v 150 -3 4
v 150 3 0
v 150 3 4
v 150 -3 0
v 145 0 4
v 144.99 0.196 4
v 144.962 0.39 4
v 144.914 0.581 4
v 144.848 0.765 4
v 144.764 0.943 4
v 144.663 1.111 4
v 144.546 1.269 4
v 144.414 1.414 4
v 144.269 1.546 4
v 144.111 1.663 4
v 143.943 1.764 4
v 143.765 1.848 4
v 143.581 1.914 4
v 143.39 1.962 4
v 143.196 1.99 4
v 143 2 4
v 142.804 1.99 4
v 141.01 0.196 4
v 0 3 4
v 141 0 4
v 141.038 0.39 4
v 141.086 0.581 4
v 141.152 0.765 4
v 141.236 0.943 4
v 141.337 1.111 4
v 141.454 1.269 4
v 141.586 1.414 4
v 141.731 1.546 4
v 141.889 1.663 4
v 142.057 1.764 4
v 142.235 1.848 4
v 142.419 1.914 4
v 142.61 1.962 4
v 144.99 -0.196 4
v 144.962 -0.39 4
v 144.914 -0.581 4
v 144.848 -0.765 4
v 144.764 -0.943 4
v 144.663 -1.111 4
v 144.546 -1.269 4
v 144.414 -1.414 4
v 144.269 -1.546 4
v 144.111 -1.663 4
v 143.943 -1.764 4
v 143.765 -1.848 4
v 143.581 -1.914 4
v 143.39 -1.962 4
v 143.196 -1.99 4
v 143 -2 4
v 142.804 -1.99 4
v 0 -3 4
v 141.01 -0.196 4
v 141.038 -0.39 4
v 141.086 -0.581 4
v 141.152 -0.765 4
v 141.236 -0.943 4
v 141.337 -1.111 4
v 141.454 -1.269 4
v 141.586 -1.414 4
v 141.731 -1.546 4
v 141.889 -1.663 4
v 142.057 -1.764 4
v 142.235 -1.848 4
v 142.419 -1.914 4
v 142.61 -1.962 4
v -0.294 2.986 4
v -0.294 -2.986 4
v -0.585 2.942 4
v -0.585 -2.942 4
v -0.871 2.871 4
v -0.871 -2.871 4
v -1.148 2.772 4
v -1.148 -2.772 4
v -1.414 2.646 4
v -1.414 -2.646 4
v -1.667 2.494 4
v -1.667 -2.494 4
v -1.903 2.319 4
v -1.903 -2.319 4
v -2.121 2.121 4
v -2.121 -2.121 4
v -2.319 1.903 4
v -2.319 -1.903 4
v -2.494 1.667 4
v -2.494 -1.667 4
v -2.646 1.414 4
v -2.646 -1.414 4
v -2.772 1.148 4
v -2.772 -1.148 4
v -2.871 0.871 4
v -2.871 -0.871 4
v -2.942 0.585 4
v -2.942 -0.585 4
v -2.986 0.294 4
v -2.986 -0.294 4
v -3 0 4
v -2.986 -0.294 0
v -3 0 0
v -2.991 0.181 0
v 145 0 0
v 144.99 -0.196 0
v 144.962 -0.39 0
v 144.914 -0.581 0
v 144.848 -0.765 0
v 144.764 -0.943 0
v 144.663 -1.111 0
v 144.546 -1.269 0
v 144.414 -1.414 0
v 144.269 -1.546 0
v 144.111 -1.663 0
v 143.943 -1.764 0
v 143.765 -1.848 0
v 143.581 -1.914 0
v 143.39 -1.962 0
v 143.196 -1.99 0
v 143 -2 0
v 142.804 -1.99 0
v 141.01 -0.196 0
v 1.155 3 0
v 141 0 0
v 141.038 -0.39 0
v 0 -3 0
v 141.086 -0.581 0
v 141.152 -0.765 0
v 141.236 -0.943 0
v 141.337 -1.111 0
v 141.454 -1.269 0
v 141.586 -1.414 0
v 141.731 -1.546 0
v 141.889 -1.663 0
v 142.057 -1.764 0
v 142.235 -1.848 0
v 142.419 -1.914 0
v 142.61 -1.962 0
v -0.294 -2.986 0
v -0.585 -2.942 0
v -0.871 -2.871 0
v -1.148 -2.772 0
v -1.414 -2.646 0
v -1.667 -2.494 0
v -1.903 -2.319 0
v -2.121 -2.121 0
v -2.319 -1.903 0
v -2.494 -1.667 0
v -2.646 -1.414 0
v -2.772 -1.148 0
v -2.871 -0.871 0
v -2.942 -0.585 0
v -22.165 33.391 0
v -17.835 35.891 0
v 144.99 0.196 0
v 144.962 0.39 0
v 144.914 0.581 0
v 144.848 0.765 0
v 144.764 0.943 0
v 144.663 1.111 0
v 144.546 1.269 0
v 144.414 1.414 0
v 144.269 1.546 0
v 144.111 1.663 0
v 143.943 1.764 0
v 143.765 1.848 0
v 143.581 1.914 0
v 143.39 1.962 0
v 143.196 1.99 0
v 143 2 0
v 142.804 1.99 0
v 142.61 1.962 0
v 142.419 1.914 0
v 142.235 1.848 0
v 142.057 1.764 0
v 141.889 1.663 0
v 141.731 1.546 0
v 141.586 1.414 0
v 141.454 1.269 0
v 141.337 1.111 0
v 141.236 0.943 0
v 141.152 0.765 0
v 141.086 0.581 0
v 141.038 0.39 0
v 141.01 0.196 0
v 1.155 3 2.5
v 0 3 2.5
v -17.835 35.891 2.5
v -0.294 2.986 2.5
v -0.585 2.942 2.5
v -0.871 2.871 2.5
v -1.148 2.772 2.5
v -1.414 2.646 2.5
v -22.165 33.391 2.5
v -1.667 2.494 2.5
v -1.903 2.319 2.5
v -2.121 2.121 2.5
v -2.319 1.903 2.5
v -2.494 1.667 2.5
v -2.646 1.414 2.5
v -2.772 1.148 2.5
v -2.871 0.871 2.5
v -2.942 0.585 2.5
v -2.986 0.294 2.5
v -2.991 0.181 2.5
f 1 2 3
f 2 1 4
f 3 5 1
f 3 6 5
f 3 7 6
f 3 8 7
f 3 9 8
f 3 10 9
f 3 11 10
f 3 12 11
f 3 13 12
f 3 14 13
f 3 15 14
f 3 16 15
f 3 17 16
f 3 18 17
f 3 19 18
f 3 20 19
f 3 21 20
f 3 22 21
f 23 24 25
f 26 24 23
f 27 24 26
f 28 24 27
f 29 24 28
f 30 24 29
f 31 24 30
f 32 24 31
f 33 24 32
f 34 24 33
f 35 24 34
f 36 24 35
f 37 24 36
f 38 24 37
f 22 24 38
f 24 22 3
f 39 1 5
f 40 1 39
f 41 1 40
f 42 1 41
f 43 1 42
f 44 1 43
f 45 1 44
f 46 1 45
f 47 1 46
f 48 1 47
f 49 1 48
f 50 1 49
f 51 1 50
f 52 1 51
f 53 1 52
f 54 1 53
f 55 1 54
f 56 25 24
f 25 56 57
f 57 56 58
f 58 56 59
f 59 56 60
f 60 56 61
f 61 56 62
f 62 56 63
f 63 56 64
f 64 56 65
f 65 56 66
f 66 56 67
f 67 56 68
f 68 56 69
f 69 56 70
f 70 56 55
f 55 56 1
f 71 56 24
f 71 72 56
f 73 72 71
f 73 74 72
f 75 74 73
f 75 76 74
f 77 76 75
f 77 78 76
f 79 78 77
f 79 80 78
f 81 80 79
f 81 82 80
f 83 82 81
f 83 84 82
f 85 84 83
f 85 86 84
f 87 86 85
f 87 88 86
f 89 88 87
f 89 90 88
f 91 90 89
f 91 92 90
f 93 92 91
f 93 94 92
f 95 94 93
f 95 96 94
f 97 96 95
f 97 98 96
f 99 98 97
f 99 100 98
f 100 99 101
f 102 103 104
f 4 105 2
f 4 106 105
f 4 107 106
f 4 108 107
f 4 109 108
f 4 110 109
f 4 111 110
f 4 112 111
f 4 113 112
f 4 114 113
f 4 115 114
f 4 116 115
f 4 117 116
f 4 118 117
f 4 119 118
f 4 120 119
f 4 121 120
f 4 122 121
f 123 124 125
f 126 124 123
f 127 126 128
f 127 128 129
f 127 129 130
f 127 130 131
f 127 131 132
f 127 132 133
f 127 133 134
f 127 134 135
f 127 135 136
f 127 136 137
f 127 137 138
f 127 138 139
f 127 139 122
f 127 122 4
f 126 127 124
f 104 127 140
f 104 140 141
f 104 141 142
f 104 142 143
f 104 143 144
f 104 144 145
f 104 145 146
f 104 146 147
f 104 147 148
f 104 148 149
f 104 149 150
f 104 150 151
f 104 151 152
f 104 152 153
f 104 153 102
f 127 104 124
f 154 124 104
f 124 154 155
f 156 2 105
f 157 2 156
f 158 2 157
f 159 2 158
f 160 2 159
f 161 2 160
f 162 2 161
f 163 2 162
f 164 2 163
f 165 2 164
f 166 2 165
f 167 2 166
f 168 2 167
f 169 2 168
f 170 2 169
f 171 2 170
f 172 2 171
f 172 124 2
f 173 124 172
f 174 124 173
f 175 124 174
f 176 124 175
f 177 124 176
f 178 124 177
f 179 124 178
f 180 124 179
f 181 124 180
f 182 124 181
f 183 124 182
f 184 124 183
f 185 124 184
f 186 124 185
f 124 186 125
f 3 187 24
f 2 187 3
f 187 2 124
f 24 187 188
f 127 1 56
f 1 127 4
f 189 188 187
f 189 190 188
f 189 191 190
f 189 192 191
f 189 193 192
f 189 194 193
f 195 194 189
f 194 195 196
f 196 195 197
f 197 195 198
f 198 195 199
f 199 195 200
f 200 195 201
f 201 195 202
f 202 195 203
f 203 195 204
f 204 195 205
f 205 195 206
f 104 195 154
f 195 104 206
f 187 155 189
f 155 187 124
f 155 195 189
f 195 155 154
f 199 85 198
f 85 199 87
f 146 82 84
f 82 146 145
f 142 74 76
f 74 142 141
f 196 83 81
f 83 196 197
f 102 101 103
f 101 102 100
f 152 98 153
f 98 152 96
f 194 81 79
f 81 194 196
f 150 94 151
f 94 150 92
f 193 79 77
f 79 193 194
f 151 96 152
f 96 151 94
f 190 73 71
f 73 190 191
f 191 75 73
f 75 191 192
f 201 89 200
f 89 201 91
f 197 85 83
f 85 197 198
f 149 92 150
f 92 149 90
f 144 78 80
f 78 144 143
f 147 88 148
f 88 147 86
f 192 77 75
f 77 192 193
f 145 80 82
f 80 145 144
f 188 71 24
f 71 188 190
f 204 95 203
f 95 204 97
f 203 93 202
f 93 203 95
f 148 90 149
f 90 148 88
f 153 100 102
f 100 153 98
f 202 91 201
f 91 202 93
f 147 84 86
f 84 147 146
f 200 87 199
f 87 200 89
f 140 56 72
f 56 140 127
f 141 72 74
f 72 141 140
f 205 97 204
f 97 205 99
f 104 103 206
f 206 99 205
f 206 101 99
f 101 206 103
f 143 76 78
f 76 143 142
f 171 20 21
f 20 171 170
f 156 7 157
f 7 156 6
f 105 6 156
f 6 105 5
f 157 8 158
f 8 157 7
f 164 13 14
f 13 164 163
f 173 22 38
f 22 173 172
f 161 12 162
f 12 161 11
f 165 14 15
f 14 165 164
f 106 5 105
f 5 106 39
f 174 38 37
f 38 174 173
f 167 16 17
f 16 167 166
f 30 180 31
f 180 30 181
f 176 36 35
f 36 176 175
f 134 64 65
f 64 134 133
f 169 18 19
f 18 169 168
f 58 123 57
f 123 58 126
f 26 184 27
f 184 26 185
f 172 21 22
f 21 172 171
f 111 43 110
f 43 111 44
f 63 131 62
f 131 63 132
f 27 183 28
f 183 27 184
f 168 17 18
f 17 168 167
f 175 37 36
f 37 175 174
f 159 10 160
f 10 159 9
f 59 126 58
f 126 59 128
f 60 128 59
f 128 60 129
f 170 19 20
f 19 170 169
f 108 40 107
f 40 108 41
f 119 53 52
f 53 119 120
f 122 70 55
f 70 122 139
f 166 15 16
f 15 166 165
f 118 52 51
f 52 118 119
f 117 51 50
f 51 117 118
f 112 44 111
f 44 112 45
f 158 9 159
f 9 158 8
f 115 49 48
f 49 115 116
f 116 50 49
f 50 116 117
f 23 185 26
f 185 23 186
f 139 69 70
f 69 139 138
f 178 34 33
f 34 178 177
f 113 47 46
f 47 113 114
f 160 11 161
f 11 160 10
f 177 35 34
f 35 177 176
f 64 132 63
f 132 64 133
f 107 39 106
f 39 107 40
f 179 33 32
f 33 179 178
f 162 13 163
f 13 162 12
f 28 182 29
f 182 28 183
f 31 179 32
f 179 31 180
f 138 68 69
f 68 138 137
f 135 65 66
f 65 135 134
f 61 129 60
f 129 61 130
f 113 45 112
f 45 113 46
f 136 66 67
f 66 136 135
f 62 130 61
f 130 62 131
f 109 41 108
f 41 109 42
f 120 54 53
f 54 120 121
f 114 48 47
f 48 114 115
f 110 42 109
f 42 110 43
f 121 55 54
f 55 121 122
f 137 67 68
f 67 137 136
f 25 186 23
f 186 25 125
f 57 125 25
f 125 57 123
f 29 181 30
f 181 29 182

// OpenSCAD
// L-shaped (hockey-stick) cell spreader for bacterial plating.
// Corrected to ensure the foot starts at the origin and handle is in the correct X range.

// --- Dimensions ---
handle_l    = 150.0; // Length of the handle
handle_w    = 6.0;   // Width of the handle
handle_t    = 4.0;   // Thickness of the handle
foot_l      = 40.0;  // Length of the spreading foot
foot_w      = 5.0;   // Width of the spreading foot
foot_t      = 2.5;   // Thickness of the spreading foot
boss_d      = 6.0;   // Diameter of the joining boss
boss_h      = 4.0;   // Height of the joining boss
hole_d      = 4.0;   // Diameter of the hanging hole
angle_deg   = 120.0; // Angle between handle and foot (counter-clockwise from +X)

$fn = 64;

module spreader() {
    difference() {
        union() {
            // 1. The Handle
            // Specification: x = 0 to 150, y = -3 to 3, z = 0 to 4
            // We use translate to place the corner at [0, -3, 0]
            translate([0, -handle_w/2, 0])
                cube([handle_l, handle_w, handle_t]);

            // 2. The Spreading Foot
            // Specification: 40mm long, 5mm wide, 2.5mm thick.
            // Center line starts at origin and points 120 deg CCW from +X.
            // To make the start at origin, we translate the cube by [foot_l/2, 0, 0]
            // then rotate around the origin.
            rotate([0, 0, angle_deg])
            translate([0, -foot_w/2, 0])
                cube([foot_l, foot_w, foot_t]);

            // 3. The Boss
            // Specification: 6mm diameter, 4mm tall at the origin.
            // We place it at the origin. Since the handle is at z=0 to 4,
            // and the foot is at z=0 to 2.5, the boss sits at the base.
            translate([0, 0, 0])
                cylinder(d = boss_d, h = boss_h);
        }

        // 4. The Hanging Hole
        // Specification: 4mm diameter through the handle at x = 143, y = 0.
        // We use a small offset to ensure it cuts through the handle faces.
        translate([143, 0, -1])
            cylinder(d = hole_d, h = handle_t + 2);
    }
}

// Render the part
spreader();
